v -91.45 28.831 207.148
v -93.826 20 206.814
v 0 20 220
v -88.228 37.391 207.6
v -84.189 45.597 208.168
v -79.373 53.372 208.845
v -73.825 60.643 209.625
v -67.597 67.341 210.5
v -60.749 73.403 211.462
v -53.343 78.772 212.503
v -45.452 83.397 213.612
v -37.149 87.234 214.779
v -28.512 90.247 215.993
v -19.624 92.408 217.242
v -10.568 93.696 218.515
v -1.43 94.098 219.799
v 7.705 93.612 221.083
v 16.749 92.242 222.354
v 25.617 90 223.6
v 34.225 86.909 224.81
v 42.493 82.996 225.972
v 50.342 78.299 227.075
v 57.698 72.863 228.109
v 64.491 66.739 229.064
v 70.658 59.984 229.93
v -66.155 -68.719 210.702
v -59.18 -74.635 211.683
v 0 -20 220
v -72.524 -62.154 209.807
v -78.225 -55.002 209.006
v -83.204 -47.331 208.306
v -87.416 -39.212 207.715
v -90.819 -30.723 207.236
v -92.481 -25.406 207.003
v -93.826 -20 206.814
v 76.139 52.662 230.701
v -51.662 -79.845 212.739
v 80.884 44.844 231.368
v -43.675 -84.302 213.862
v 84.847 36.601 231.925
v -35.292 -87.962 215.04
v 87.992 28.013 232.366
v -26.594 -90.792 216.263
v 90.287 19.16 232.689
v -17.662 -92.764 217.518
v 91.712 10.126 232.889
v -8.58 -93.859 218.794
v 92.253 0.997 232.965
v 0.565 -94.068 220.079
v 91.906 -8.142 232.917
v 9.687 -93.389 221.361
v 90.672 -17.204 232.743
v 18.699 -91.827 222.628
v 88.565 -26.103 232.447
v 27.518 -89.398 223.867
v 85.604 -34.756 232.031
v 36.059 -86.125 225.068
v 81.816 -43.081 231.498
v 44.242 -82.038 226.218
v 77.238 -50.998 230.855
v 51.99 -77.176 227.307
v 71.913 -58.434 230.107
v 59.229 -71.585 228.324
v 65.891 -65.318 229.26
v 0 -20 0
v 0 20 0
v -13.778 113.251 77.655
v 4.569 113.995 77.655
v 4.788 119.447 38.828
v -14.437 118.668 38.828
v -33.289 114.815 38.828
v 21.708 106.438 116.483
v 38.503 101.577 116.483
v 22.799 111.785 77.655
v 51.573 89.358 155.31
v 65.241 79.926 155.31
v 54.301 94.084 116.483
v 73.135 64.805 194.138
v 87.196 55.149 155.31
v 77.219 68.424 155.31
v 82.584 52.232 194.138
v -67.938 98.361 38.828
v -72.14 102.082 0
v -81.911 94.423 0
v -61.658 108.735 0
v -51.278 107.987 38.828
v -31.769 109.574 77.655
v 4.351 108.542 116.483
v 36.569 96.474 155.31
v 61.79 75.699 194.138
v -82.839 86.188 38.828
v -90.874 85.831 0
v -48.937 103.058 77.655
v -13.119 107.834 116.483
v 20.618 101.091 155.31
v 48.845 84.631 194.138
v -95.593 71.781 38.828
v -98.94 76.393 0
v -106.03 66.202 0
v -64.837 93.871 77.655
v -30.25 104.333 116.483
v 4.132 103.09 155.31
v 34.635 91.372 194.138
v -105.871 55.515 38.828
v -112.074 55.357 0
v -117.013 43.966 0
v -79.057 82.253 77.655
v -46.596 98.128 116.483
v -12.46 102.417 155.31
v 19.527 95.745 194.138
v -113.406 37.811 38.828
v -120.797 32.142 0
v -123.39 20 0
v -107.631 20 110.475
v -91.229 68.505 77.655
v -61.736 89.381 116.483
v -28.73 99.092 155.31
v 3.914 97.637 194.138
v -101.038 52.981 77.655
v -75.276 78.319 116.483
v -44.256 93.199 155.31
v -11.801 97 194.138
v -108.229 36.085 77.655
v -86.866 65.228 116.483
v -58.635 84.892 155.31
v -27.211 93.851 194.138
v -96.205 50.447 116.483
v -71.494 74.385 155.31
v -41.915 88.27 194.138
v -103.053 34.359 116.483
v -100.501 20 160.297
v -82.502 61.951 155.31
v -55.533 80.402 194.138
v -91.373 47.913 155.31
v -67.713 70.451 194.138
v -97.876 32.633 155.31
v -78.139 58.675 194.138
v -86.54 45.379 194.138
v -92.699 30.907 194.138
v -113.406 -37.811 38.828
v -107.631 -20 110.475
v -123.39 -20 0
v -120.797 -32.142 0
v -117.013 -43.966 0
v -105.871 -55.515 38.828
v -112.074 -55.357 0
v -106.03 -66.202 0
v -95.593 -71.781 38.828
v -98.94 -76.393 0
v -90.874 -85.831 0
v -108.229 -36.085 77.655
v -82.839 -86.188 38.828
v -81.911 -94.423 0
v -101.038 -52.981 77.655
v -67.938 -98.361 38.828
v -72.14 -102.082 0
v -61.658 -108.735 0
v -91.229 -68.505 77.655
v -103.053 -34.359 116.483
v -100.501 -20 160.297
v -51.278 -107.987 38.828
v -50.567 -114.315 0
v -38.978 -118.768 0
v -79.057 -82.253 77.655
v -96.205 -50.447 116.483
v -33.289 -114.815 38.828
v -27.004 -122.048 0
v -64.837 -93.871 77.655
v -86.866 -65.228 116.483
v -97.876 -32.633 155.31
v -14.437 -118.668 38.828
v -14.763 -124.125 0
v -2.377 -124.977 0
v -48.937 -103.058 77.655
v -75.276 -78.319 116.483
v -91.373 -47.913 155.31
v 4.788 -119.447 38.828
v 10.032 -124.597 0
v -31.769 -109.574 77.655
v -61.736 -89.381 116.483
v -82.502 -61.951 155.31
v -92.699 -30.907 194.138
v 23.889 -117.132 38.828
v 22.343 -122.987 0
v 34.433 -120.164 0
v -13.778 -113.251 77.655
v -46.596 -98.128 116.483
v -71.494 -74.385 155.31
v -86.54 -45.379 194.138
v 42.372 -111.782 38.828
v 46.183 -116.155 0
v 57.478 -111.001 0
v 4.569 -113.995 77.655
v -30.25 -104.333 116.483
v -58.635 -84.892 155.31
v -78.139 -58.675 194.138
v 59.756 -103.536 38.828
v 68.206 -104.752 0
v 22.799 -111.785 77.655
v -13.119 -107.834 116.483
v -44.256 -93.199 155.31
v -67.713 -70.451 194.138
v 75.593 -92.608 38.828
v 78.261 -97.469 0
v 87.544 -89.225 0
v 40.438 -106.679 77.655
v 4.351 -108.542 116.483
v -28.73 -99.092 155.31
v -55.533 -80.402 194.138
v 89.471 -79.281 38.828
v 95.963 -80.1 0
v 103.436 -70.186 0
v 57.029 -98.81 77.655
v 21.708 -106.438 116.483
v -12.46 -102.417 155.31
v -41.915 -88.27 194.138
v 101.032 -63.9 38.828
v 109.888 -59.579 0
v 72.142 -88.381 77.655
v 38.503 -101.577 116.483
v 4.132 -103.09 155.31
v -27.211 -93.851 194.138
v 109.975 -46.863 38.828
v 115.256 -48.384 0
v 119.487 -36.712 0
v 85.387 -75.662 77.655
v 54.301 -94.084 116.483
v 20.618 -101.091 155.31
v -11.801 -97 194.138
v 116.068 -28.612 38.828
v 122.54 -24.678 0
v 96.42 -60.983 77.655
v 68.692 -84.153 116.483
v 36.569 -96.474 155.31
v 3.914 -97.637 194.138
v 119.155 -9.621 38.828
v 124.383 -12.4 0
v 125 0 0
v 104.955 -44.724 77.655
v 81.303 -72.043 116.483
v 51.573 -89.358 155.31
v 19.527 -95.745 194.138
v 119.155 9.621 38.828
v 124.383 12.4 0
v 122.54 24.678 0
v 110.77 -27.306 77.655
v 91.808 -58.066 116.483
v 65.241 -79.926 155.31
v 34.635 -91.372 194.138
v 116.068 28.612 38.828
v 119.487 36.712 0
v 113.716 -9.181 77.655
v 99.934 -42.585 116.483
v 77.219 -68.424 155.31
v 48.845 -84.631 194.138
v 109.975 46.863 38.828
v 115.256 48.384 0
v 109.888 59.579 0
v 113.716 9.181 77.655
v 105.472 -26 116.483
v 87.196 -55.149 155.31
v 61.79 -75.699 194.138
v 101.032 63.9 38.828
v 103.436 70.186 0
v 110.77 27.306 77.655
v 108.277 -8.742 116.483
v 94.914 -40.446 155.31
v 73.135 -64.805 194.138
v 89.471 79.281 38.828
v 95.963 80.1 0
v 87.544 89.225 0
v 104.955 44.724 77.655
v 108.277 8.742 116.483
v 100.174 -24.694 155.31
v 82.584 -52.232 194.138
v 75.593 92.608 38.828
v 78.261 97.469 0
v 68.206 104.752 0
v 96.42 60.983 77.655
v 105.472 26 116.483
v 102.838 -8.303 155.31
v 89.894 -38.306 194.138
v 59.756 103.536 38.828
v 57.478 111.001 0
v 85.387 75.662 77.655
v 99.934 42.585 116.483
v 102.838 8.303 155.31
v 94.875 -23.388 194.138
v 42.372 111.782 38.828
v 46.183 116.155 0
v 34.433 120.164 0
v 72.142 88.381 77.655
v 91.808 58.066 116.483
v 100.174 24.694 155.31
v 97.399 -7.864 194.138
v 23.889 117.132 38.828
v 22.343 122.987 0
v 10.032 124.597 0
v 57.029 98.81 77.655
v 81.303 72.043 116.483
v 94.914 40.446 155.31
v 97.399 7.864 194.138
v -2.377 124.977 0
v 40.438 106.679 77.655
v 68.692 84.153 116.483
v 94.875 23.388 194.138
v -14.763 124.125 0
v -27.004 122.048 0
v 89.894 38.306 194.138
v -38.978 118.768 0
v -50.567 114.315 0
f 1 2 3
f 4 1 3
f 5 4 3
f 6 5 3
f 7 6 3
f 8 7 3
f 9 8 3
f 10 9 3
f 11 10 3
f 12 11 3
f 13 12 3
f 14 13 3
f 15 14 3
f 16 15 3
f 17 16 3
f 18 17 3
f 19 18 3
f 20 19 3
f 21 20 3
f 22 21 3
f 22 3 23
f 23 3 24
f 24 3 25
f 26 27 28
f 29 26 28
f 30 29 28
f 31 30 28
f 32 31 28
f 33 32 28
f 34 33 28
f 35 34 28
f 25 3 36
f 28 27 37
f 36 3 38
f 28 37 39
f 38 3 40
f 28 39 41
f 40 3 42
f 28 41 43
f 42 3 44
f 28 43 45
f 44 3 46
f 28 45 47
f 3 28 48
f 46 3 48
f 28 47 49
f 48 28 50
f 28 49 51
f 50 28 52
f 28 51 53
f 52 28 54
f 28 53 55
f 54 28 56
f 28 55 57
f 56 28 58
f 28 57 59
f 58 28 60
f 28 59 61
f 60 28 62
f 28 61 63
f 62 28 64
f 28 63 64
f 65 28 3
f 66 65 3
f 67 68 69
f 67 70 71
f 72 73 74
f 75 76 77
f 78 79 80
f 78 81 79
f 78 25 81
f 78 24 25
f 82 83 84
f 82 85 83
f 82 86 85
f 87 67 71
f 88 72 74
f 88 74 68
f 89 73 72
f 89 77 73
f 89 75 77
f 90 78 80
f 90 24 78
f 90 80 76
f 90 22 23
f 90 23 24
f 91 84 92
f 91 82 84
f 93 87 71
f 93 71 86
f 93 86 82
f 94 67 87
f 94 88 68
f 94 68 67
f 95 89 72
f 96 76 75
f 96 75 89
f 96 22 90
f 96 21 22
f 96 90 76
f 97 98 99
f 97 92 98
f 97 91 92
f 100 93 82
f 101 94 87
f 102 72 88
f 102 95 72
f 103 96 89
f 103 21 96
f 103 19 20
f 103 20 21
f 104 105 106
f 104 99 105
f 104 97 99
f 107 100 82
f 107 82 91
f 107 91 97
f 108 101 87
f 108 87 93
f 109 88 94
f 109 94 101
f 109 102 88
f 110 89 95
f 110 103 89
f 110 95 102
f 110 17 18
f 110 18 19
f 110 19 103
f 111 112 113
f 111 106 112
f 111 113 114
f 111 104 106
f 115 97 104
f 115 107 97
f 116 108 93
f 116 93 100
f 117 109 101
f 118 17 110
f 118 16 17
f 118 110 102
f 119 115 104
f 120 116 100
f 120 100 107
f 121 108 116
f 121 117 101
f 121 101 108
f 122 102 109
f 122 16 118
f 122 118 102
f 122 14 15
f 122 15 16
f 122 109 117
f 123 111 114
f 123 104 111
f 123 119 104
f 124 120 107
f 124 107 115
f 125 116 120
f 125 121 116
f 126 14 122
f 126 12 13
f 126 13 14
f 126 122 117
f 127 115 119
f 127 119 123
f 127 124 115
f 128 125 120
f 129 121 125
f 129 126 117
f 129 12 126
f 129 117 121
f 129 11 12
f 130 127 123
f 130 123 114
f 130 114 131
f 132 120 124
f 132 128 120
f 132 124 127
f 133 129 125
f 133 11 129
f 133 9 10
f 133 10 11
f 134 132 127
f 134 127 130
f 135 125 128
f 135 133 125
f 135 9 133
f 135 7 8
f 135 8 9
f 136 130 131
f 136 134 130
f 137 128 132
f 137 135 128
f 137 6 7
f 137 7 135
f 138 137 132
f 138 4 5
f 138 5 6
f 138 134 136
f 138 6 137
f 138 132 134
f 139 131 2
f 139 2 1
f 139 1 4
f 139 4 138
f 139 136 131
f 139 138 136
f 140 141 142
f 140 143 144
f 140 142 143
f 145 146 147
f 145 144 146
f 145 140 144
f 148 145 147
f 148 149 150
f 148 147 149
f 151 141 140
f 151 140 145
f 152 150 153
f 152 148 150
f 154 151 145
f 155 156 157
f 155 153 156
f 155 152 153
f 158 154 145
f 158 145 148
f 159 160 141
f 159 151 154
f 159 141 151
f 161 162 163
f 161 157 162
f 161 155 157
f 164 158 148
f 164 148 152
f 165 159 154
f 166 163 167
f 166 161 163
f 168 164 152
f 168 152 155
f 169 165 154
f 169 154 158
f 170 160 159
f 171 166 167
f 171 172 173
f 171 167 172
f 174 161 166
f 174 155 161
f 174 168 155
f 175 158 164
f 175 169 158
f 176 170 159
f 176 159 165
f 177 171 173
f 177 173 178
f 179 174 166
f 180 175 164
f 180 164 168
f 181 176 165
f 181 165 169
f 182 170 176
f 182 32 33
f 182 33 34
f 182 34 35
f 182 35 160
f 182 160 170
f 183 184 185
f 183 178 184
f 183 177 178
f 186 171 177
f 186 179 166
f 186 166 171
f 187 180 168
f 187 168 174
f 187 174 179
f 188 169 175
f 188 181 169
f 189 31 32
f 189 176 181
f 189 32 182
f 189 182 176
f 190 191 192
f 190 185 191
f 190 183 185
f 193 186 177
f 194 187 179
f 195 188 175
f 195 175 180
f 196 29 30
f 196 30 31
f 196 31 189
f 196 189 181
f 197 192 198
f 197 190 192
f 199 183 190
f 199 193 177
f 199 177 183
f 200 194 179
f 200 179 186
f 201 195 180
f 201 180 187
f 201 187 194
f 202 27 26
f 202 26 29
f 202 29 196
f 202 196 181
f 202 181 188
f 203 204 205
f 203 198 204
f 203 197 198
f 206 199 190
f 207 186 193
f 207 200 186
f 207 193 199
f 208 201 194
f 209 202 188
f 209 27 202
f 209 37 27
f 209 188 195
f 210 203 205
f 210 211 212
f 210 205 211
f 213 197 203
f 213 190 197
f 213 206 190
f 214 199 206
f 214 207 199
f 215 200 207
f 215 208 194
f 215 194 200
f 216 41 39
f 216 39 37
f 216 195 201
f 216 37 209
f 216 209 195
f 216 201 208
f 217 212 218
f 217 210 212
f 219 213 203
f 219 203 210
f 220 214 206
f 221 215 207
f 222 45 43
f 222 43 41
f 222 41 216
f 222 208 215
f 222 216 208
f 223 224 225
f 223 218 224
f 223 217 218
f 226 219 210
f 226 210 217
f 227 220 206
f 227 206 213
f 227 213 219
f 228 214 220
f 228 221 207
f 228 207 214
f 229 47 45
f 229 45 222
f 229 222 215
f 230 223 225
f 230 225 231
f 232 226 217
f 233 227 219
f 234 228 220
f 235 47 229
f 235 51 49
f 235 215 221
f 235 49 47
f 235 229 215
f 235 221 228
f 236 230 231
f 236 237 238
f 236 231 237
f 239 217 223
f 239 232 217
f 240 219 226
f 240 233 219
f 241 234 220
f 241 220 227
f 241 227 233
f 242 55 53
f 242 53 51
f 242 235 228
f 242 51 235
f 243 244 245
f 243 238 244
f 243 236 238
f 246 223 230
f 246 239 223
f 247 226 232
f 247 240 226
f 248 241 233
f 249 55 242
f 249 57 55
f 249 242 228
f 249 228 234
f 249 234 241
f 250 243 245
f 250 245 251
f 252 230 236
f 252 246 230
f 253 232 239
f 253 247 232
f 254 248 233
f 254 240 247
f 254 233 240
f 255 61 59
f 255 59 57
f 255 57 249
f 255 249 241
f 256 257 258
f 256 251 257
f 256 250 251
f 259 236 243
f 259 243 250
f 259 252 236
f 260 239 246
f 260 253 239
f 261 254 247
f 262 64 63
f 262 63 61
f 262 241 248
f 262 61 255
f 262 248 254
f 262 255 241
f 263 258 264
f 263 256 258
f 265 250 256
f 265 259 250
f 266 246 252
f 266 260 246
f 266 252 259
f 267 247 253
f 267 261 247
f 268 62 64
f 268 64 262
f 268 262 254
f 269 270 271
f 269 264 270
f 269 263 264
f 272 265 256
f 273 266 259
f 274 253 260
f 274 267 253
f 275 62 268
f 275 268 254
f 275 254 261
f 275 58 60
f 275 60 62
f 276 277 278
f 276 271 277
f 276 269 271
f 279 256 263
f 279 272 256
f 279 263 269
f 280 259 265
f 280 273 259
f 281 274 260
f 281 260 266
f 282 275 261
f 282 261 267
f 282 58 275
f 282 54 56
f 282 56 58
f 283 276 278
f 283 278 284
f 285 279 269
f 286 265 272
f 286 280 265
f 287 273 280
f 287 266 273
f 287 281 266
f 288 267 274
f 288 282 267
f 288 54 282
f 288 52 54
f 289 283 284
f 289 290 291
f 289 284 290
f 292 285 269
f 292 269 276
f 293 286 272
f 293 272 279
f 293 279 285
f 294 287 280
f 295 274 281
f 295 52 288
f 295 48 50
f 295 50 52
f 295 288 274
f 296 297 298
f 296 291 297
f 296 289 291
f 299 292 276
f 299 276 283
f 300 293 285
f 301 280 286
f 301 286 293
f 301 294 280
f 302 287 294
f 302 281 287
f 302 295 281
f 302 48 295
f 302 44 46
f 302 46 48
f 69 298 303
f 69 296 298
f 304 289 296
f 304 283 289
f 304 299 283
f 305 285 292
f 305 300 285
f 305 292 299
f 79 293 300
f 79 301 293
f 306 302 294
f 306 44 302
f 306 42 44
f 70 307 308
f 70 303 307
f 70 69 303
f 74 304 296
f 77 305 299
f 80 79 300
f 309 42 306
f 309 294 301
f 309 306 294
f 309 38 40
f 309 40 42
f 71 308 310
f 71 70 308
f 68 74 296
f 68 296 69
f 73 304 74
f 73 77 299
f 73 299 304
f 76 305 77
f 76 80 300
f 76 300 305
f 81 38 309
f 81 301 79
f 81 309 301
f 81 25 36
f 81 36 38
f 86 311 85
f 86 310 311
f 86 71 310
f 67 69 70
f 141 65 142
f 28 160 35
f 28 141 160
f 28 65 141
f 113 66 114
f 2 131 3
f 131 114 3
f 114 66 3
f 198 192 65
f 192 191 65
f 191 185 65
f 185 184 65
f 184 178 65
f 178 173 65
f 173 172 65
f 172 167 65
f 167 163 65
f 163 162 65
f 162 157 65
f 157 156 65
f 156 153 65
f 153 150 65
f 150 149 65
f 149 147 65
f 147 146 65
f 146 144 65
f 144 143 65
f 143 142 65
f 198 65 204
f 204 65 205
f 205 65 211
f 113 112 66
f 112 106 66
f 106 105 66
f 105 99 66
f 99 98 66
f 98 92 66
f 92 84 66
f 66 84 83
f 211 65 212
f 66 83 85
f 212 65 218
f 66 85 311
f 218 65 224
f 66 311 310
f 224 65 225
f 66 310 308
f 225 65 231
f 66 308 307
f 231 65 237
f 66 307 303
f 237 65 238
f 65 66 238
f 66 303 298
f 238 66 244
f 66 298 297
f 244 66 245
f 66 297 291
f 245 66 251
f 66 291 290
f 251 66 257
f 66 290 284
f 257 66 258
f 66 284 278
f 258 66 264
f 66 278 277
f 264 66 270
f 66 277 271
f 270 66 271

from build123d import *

# Parameters (mm, degrees)
F0_R     = 125
F1_DEPTH = 250
F1_TAPER = 8
F2_W     = 40
F2_H     = 250
F3_DEPTH = 150
F7_R     = 150
F8_DEPTH = 46.8815590493


with BuildPart() as f1:
    # F0 (on Top) → F1 (new body)
    with BuildSketch(Plane.XY):
        Circle(F0_R)
    extrude(amount=F1_DEPTH, taper=F1_TAPER)

    # F2 (on Right) → F3 (cut)
    with BuildSketch(Plane.YZ):
        with Locations((0, 125)):
            Rectangle(F2_W, F2_H)
    extrude(amount=-F3_DEPTH, mode=Mode.SUBTRACT)

    # F7 (on line) → F8 (cut, through all)
    with BuildSketch(Plane(origin=(-30.3201091399, 0, 215.7387865532), x_dir=(0.9902680687, 0, 0.139173101), z_dir=(0.139173101, 0, -0.9902680687))):
        Circle(F7_R)
    extrude(amount=-F8_DEPTH, mode=Mode.SUBTRACT)


solid = f1.part
